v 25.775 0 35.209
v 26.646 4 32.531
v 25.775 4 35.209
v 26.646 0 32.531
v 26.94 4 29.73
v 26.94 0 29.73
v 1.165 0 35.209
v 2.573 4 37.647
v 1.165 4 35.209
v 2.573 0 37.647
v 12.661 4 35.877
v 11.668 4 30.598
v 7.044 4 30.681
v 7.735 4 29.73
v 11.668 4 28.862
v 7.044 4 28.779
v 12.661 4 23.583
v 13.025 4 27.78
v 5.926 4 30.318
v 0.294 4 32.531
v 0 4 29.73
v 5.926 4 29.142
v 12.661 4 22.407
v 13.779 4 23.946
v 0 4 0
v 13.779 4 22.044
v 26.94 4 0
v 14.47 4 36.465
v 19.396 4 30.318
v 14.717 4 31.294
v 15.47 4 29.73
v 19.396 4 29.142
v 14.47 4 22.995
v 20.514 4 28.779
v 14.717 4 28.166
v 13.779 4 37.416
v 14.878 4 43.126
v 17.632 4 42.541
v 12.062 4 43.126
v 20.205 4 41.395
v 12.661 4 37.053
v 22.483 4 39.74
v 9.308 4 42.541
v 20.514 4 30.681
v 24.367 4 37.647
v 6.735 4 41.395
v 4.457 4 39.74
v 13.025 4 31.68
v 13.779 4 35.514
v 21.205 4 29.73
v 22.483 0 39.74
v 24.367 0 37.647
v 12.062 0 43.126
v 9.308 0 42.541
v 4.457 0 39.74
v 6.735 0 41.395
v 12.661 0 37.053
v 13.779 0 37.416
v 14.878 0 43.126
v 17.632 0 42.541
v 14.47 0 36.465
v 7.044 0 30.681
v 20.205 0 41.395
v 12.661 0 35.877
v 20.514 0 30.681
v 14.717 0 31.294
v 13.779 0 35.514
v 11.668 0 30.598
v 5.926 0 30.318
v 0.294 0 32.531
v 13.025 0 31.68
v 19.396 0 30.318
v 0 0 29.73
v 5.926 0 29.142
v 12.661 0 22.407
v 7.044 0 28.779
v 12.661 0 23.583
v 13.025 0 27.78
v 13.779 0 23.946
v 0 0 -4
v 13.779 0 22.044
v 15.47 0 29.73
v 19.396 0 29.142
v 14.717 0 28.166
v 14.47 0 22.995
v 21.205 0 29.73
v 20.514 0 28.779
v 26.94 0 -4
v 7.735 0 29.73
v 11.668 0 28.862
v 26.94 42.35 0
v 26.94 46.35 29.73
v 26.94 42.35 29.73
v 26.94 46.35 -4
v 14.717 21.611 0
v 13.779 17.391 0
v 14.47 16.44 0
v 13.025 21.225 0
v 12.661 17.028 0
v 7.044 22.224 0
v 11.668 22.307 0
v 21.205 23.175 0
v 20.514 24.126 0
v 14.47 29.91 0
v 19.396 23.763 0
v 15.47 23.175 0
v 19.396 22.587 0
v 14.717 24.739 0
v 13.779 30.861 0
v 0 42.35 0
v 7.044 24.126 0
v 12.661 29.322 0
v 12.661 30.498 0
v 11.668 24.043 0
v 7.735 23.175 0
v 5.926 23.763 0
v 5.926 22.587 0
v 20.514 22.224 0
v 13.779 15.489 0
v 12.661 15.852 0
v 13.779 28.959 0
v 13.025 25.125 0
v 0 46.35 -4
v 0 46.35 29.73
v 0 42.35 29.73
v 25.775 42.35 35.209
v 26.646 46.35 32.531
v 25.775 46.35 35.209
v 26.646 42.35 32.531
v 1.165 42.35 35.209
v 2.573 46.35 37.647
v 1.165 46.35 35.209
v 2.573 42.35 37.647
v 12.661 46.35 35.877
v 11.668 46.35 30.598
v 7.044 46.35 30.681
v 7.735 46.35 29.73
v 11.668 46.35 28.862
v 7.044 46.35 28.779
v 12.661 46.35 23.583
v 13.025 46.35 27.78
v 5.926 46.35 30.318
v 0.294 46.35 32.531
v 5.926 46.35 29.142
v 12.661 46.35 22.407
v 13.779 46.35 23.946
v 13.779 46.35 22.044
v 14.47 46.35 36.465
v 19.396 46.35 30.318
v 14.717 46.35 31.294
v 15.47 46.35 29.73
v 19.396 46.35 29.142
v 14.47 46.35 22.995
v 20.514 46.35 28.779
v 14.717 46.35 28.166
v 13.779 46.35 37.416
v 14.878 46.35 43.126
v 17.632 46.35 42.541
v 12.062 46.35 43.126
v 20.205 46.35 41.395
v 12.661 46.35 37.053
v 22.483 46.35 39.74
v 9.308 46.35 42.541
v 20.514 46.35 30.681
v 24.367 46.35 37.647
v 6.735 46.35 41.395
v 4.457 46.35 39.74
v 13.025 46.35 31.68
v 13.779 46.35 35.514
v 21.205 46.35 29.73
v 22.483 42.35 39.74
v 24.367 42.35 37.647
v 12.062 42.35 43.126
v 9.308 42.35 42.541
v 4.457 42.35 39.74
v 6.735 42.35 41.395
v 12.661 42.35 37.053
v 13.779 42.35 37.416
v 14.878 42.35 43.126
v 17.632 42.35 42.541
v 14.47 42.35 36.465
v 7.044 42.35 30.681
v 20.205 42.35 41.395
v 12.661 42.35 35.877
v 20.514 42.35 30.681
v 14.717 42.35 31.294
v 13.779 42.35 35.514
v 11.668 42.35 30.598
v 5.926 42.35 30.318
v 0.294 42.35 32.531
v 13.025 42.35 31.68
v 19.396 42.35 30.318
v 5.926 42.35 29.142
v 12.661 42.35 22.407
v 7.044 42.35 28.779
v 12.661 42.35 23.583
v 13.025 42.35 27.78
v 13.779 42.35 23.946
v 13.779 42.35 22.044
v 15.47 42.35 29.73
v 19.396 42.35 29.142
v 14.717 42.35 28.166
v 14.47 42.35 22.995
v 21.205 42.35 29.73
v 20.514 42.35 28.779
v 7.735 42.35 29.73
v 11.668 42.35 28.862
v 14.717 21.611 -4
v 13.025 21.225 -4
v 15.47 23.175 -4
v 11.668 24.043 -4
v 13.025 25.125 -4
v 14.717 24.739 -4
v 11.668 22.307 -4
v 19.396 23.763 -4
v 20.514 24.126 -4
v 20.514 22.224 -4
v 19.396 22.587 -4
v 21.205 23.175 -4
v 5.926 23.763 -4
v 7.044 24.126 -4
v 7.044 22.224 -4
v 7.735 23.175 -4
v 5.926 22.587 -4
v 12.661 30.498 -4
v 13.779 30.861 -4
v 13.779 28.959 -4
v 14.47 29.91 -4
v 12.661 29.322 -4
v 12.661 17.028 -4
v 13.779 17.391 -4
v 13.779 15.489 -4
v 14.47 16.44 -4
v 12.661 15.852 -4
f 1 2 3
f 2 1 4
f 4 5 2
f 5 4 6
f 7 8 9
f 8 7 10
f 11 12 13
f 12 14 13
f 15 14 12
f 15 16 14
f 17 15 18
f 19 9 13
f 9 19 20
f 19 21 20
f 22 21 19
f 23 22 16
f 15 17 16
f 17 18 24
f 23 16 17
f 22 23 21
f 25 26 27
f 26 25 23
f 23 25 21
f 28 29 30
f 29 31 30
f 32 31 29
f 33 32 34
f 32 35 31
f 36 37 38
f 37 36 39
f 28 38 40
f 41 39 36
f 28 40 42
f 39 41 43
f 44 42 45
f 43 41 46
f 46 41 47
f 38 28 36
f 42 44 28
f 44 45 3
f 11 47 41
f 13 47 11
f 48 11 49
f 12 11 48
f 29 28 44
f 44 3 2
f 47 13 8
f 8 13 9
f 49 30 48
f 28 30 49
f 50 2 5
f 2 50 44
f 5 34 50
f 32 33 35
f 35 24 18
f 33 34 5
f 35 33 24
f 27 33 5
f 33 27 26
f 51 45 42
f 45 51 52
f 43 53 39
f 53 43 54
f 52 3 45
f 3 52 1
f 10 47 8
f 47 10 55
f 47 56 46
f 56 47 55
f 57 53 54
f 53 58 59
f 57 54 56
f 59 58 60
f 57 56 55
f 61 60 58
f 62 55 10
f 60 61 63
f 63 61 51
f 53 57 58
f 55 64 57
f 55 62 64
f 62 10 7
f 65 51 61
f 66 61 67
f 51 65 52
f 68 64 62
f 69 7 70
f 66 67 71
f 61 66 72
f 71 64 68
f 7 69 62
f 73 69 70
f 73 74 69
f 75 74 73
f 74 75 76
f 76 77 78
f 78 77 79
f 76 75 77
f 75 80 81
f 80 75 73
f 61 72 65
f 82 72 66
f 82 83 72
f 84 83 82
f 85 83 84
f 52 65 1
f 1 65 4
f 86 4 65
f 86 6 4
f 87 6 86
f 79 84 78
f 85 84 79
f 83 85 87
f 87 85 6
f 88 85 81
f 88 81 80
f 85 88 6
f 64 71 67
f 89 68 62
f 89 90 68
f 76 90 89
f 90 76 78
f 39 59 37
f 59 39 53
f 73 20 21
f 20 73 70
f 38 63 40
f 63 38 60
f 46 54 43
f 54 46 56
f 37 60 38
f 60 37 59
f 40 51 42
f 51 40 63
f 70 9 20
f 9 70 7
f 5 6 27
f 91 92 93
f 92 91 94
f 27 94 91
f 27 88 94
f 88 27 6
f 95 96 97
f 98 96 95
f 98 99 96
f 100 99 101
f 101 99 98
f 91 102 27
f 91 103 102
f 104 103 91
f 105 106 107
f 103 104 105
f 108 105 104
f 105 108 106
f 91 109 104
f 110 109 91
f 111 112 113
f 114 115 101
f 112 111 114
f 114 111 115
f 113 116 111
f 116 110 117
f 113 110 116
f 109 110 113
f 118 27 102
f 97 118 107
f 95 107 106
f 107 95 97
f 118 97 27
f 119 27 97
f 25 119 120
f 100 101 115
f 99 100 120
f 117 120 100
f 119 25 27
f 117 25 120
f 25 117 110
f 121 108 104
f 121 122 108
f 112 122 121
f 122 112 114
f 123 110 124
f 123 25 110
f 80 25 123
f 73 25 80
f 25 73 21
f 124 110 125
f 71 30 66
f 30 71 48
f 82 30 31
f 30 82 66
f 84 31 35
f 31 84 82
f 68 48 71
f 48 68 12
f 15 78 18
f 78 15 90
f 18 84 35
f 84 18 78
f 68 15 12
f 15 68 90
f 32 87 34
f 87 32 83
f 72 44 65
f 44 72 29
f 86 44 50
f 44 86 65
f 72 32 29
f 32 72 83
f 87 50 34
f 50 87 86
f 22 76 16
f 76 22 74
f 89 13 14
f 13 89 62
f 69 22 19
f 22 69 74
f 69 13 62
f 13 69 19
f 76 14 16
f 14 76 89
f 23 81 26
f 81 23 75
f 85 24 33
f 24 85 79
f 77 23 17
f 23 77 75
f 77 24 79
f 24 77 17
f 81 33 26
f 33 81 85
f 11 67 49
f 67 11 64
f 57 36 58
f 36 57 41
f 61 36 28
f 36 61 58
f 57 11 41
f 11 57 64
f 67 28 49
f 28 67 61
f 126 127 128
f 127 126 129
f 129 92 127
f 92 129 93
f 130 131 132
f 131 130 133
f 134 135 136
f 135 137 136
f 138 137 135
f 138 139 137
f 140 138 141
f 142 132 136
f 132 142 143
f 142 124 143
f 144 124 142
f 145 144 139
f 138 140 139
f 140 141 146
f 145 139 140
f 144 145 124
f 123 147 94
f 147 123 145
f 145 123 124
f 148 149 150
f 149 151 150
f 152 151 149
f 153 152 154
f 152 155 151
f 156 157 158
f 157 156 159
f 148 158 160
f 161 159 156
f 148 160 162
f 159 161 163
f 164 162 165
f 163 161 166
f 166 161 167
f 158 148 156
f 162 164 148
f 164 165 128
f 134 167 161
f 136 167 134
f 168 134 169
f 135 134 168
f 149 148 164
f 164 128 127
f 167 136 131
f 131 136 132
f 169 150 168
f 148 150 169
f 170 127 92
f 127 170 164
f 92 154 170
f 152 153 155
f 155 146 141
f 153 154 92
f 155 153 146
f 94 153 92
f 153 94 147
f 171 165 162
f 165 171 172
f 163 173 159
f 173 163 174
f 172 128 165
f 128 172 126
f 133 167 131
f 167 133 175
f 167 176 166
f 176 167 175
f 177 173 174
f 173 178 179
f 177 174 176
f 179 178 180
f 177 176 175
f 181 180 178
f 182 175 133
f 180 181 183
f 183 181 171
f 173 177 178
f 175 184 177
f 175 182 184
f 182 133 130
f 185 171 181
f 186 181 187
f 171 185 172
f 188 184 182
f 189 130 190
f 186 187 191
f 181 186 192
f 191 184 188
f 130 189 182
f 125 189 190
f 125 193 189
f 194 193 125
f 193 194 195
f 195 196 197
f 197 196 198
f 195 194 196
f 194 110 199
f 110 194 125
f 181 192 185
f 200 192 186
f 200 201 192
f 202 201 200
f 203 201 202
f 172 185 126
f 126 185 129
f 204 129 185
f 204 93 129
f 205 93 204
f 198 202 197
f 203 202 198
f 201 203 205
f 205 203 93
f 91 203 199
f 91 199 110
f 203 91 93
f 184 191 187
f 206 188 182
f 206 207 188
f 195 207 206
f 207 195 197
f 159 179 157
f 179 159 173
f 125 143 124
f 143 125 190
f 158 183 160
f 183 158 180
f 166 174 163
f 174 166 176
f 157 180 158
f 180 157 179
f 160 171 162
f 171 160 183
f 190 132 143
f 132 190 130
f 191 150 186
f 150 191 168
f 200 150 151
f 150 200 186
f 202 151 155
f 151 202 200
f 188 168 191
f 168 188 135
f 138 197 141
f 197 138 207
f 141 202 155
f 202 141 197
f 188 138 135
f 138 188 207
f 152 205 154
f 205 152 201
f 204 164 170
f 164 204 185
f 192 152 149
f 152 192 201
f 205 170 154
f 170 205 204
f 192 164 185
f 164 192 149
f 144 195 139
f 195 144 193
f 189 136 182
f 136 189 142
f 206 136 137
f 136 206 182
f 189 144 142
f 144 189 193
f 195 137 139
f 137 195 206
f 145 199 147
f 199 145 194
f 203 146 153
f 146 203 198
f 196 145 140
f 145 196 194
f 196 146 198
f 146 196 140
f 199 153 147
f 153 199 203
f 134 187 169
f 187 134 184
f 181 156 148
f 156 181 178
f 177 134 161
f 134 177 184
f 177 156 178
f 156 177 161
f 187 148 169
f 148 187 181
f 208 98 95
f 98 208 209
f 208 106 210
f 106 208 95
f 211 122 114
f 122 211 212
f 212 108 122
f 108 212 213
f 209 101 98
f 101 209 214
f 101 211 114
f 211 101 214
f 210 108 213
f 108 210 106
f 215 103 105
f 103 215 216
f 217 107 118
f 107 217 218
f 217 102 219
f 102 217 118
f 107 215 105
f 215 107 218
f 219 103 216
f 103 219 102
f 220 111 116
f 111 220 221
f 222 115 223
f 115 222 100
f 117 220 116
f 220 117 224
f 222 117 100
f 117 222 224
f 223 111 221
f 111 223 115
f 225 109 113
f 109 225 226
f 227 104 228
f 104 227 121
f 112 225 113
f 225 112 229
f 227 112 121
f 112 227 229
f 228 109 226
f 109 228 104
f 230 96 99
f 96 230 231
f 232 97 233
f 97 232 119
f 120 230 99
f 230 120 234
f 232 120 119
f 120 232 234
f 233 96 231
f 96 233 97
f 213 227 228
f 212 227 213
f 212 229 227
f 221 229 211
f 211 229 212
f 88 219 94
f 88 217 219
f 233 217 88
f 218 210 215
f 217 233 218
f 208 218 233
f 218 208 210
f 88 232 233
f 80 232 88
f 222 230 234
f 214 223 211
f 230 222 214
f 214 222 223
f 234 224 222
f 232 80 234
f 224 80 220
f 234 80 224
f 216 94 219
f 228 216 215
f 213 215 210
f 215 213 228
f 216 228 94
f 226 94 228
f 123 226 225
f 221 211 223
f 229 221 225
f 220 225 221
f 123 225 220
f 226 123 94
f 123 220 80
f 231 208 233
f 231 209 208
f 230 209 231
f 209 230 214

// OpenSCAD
module servo_bracket_C()
{

A = 19.82;
B = 13.47;
C = 33.79;
D = 10.17;
E = 9.66;
F = 30.22;
G = 11.68;
H = 26.67;
J = 52.84;

thickness = 4;

module pinhole( x, y, z ){
	translate([x,y,z]){
		rotate(90,[1,0,0]){
			cylinder(h=thickness+2,r=1);
		}
	}
}

module pivothole( x, y, z ){
	translate([x,y,z]){
		rotate(90,[1,0,0]){
			cylinder(h=thickness+2,r=2);
		}
	}
}

module mountpoint( x, y, z ){
		//one pivot hole in the center
		pivothole( x, y, z );

		//four mount holes
		pinhole( x+(B/2), y, z );
		pinhole( x-(B/2), y, z );
		pinhole( x, y, z-(B/2) );
		pinhole( x, y, z+(B/2) );
}

	//zero ball
	//sphere(r=1);

	//front plate
	difference(){
		union(){
			translate( [ B, thickness, A*1.5 ] ){
				rotate( 90, [ 1, 0, 0 ] ){
					cylinder( h=thickness, r=B );
				}
			}
			cube( size=[ B*2, thickness, A*1.5 ] );
		}

		mountpoint( B, thickness+1, A*1.5 );
	}

	//back plate
	//sanity check ball
	//translate( [ 0, H+G, 0 ] ){
	//	sphere(r=1);
	//}
	difference(){
		union(){
			translate( [ B, H+G+(thickness*2), A*1.5 ] ){
				rotate( 90, [ 1, 0, 0 ] ){
					cylinder( h=thickness, r=B );
				}
			}
			translate( [ 0, H+G+thickness, 0 ] ){
				cube( size=[ B*2, thickness, A*1.5 ] );
			}
		}

		//mount point behind servo
		mountpoint( B, H+G+(thickness*2)+1, A*1.5 );
	}

	//base
	difference(){
		translate( [ 0, 0, -thickness ] ){
			cube( size=[ B*2, H+G+(thickness*2), thickness ] );
		}
		rotate( 90, [ 1, 0, 0 ] ){
			mountpoint( B, 1, -(H+G+(thickness*2))/2 );
		}
	}
}

servo_bracket_C();
